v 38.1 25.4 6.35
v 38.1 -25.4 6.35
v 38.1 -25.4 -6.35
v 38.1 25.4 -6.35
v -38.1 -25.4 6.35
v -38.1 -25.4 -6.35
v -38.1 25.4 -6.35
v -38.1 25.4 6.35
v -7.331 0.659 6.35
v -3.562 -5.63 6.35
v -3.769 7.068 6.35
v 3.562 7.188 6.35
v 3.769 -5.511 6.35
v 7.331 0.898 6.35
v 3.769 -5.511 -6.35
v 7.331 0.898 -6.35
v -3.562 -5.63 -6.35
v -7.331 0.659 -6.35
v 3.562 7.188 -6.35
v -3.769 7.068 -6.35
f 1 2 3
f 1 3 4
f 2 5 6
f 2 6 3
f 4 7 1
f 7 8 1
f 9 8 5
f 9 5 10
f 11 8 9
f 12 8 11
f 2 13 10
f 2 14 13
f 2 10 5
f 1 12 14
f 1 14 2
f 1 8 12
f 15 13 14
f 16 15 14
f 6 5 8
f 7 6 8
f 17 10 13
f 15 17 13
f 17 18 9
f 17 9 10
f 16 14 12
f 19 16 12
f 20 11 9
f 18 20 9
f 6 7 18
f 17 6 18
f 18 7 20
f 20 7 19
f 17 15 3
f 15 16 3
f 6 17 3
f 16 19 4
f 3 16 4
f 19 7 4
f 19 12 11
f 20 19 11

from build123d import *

# Parameters (mm, degrees)
SKETCH1_W           = 76.2
SKETCH1_H           = 50.8
BOSS_EXTRUDE1_DEPTH = 6.35
CUT_EXTRUDE1_DEPTH  = 13.7


with BuildPart() as part:
    # Sketch1 → Boss-Extrude1 (new body, symmetric)
    with BuildSketch(Plane.XY):
        Rectangle(SKETCH1_W, SKETCH1_H)
    extrude(amount=BOSS_EXTRUDE1_DEPTH, both=True)

    # Sketch3 → Cut-Extrude1 (cut, through all)
    with BuildSketch(Plane.XY.offset(6.35)):
        Polygon((-3.5620661, -5.630417032), (3.769306023, -5.510767006), (7.331372123, 0.89821251), (3.5620661, 7.187542), (-3.769306023, 7.067891975), (-7.331372123, 0.658912459), align=None)
    extrude(amount=-CUT_EXTRUDE1_DEPTH, mode=Mode.SUBTRACT)


solid = part.part
